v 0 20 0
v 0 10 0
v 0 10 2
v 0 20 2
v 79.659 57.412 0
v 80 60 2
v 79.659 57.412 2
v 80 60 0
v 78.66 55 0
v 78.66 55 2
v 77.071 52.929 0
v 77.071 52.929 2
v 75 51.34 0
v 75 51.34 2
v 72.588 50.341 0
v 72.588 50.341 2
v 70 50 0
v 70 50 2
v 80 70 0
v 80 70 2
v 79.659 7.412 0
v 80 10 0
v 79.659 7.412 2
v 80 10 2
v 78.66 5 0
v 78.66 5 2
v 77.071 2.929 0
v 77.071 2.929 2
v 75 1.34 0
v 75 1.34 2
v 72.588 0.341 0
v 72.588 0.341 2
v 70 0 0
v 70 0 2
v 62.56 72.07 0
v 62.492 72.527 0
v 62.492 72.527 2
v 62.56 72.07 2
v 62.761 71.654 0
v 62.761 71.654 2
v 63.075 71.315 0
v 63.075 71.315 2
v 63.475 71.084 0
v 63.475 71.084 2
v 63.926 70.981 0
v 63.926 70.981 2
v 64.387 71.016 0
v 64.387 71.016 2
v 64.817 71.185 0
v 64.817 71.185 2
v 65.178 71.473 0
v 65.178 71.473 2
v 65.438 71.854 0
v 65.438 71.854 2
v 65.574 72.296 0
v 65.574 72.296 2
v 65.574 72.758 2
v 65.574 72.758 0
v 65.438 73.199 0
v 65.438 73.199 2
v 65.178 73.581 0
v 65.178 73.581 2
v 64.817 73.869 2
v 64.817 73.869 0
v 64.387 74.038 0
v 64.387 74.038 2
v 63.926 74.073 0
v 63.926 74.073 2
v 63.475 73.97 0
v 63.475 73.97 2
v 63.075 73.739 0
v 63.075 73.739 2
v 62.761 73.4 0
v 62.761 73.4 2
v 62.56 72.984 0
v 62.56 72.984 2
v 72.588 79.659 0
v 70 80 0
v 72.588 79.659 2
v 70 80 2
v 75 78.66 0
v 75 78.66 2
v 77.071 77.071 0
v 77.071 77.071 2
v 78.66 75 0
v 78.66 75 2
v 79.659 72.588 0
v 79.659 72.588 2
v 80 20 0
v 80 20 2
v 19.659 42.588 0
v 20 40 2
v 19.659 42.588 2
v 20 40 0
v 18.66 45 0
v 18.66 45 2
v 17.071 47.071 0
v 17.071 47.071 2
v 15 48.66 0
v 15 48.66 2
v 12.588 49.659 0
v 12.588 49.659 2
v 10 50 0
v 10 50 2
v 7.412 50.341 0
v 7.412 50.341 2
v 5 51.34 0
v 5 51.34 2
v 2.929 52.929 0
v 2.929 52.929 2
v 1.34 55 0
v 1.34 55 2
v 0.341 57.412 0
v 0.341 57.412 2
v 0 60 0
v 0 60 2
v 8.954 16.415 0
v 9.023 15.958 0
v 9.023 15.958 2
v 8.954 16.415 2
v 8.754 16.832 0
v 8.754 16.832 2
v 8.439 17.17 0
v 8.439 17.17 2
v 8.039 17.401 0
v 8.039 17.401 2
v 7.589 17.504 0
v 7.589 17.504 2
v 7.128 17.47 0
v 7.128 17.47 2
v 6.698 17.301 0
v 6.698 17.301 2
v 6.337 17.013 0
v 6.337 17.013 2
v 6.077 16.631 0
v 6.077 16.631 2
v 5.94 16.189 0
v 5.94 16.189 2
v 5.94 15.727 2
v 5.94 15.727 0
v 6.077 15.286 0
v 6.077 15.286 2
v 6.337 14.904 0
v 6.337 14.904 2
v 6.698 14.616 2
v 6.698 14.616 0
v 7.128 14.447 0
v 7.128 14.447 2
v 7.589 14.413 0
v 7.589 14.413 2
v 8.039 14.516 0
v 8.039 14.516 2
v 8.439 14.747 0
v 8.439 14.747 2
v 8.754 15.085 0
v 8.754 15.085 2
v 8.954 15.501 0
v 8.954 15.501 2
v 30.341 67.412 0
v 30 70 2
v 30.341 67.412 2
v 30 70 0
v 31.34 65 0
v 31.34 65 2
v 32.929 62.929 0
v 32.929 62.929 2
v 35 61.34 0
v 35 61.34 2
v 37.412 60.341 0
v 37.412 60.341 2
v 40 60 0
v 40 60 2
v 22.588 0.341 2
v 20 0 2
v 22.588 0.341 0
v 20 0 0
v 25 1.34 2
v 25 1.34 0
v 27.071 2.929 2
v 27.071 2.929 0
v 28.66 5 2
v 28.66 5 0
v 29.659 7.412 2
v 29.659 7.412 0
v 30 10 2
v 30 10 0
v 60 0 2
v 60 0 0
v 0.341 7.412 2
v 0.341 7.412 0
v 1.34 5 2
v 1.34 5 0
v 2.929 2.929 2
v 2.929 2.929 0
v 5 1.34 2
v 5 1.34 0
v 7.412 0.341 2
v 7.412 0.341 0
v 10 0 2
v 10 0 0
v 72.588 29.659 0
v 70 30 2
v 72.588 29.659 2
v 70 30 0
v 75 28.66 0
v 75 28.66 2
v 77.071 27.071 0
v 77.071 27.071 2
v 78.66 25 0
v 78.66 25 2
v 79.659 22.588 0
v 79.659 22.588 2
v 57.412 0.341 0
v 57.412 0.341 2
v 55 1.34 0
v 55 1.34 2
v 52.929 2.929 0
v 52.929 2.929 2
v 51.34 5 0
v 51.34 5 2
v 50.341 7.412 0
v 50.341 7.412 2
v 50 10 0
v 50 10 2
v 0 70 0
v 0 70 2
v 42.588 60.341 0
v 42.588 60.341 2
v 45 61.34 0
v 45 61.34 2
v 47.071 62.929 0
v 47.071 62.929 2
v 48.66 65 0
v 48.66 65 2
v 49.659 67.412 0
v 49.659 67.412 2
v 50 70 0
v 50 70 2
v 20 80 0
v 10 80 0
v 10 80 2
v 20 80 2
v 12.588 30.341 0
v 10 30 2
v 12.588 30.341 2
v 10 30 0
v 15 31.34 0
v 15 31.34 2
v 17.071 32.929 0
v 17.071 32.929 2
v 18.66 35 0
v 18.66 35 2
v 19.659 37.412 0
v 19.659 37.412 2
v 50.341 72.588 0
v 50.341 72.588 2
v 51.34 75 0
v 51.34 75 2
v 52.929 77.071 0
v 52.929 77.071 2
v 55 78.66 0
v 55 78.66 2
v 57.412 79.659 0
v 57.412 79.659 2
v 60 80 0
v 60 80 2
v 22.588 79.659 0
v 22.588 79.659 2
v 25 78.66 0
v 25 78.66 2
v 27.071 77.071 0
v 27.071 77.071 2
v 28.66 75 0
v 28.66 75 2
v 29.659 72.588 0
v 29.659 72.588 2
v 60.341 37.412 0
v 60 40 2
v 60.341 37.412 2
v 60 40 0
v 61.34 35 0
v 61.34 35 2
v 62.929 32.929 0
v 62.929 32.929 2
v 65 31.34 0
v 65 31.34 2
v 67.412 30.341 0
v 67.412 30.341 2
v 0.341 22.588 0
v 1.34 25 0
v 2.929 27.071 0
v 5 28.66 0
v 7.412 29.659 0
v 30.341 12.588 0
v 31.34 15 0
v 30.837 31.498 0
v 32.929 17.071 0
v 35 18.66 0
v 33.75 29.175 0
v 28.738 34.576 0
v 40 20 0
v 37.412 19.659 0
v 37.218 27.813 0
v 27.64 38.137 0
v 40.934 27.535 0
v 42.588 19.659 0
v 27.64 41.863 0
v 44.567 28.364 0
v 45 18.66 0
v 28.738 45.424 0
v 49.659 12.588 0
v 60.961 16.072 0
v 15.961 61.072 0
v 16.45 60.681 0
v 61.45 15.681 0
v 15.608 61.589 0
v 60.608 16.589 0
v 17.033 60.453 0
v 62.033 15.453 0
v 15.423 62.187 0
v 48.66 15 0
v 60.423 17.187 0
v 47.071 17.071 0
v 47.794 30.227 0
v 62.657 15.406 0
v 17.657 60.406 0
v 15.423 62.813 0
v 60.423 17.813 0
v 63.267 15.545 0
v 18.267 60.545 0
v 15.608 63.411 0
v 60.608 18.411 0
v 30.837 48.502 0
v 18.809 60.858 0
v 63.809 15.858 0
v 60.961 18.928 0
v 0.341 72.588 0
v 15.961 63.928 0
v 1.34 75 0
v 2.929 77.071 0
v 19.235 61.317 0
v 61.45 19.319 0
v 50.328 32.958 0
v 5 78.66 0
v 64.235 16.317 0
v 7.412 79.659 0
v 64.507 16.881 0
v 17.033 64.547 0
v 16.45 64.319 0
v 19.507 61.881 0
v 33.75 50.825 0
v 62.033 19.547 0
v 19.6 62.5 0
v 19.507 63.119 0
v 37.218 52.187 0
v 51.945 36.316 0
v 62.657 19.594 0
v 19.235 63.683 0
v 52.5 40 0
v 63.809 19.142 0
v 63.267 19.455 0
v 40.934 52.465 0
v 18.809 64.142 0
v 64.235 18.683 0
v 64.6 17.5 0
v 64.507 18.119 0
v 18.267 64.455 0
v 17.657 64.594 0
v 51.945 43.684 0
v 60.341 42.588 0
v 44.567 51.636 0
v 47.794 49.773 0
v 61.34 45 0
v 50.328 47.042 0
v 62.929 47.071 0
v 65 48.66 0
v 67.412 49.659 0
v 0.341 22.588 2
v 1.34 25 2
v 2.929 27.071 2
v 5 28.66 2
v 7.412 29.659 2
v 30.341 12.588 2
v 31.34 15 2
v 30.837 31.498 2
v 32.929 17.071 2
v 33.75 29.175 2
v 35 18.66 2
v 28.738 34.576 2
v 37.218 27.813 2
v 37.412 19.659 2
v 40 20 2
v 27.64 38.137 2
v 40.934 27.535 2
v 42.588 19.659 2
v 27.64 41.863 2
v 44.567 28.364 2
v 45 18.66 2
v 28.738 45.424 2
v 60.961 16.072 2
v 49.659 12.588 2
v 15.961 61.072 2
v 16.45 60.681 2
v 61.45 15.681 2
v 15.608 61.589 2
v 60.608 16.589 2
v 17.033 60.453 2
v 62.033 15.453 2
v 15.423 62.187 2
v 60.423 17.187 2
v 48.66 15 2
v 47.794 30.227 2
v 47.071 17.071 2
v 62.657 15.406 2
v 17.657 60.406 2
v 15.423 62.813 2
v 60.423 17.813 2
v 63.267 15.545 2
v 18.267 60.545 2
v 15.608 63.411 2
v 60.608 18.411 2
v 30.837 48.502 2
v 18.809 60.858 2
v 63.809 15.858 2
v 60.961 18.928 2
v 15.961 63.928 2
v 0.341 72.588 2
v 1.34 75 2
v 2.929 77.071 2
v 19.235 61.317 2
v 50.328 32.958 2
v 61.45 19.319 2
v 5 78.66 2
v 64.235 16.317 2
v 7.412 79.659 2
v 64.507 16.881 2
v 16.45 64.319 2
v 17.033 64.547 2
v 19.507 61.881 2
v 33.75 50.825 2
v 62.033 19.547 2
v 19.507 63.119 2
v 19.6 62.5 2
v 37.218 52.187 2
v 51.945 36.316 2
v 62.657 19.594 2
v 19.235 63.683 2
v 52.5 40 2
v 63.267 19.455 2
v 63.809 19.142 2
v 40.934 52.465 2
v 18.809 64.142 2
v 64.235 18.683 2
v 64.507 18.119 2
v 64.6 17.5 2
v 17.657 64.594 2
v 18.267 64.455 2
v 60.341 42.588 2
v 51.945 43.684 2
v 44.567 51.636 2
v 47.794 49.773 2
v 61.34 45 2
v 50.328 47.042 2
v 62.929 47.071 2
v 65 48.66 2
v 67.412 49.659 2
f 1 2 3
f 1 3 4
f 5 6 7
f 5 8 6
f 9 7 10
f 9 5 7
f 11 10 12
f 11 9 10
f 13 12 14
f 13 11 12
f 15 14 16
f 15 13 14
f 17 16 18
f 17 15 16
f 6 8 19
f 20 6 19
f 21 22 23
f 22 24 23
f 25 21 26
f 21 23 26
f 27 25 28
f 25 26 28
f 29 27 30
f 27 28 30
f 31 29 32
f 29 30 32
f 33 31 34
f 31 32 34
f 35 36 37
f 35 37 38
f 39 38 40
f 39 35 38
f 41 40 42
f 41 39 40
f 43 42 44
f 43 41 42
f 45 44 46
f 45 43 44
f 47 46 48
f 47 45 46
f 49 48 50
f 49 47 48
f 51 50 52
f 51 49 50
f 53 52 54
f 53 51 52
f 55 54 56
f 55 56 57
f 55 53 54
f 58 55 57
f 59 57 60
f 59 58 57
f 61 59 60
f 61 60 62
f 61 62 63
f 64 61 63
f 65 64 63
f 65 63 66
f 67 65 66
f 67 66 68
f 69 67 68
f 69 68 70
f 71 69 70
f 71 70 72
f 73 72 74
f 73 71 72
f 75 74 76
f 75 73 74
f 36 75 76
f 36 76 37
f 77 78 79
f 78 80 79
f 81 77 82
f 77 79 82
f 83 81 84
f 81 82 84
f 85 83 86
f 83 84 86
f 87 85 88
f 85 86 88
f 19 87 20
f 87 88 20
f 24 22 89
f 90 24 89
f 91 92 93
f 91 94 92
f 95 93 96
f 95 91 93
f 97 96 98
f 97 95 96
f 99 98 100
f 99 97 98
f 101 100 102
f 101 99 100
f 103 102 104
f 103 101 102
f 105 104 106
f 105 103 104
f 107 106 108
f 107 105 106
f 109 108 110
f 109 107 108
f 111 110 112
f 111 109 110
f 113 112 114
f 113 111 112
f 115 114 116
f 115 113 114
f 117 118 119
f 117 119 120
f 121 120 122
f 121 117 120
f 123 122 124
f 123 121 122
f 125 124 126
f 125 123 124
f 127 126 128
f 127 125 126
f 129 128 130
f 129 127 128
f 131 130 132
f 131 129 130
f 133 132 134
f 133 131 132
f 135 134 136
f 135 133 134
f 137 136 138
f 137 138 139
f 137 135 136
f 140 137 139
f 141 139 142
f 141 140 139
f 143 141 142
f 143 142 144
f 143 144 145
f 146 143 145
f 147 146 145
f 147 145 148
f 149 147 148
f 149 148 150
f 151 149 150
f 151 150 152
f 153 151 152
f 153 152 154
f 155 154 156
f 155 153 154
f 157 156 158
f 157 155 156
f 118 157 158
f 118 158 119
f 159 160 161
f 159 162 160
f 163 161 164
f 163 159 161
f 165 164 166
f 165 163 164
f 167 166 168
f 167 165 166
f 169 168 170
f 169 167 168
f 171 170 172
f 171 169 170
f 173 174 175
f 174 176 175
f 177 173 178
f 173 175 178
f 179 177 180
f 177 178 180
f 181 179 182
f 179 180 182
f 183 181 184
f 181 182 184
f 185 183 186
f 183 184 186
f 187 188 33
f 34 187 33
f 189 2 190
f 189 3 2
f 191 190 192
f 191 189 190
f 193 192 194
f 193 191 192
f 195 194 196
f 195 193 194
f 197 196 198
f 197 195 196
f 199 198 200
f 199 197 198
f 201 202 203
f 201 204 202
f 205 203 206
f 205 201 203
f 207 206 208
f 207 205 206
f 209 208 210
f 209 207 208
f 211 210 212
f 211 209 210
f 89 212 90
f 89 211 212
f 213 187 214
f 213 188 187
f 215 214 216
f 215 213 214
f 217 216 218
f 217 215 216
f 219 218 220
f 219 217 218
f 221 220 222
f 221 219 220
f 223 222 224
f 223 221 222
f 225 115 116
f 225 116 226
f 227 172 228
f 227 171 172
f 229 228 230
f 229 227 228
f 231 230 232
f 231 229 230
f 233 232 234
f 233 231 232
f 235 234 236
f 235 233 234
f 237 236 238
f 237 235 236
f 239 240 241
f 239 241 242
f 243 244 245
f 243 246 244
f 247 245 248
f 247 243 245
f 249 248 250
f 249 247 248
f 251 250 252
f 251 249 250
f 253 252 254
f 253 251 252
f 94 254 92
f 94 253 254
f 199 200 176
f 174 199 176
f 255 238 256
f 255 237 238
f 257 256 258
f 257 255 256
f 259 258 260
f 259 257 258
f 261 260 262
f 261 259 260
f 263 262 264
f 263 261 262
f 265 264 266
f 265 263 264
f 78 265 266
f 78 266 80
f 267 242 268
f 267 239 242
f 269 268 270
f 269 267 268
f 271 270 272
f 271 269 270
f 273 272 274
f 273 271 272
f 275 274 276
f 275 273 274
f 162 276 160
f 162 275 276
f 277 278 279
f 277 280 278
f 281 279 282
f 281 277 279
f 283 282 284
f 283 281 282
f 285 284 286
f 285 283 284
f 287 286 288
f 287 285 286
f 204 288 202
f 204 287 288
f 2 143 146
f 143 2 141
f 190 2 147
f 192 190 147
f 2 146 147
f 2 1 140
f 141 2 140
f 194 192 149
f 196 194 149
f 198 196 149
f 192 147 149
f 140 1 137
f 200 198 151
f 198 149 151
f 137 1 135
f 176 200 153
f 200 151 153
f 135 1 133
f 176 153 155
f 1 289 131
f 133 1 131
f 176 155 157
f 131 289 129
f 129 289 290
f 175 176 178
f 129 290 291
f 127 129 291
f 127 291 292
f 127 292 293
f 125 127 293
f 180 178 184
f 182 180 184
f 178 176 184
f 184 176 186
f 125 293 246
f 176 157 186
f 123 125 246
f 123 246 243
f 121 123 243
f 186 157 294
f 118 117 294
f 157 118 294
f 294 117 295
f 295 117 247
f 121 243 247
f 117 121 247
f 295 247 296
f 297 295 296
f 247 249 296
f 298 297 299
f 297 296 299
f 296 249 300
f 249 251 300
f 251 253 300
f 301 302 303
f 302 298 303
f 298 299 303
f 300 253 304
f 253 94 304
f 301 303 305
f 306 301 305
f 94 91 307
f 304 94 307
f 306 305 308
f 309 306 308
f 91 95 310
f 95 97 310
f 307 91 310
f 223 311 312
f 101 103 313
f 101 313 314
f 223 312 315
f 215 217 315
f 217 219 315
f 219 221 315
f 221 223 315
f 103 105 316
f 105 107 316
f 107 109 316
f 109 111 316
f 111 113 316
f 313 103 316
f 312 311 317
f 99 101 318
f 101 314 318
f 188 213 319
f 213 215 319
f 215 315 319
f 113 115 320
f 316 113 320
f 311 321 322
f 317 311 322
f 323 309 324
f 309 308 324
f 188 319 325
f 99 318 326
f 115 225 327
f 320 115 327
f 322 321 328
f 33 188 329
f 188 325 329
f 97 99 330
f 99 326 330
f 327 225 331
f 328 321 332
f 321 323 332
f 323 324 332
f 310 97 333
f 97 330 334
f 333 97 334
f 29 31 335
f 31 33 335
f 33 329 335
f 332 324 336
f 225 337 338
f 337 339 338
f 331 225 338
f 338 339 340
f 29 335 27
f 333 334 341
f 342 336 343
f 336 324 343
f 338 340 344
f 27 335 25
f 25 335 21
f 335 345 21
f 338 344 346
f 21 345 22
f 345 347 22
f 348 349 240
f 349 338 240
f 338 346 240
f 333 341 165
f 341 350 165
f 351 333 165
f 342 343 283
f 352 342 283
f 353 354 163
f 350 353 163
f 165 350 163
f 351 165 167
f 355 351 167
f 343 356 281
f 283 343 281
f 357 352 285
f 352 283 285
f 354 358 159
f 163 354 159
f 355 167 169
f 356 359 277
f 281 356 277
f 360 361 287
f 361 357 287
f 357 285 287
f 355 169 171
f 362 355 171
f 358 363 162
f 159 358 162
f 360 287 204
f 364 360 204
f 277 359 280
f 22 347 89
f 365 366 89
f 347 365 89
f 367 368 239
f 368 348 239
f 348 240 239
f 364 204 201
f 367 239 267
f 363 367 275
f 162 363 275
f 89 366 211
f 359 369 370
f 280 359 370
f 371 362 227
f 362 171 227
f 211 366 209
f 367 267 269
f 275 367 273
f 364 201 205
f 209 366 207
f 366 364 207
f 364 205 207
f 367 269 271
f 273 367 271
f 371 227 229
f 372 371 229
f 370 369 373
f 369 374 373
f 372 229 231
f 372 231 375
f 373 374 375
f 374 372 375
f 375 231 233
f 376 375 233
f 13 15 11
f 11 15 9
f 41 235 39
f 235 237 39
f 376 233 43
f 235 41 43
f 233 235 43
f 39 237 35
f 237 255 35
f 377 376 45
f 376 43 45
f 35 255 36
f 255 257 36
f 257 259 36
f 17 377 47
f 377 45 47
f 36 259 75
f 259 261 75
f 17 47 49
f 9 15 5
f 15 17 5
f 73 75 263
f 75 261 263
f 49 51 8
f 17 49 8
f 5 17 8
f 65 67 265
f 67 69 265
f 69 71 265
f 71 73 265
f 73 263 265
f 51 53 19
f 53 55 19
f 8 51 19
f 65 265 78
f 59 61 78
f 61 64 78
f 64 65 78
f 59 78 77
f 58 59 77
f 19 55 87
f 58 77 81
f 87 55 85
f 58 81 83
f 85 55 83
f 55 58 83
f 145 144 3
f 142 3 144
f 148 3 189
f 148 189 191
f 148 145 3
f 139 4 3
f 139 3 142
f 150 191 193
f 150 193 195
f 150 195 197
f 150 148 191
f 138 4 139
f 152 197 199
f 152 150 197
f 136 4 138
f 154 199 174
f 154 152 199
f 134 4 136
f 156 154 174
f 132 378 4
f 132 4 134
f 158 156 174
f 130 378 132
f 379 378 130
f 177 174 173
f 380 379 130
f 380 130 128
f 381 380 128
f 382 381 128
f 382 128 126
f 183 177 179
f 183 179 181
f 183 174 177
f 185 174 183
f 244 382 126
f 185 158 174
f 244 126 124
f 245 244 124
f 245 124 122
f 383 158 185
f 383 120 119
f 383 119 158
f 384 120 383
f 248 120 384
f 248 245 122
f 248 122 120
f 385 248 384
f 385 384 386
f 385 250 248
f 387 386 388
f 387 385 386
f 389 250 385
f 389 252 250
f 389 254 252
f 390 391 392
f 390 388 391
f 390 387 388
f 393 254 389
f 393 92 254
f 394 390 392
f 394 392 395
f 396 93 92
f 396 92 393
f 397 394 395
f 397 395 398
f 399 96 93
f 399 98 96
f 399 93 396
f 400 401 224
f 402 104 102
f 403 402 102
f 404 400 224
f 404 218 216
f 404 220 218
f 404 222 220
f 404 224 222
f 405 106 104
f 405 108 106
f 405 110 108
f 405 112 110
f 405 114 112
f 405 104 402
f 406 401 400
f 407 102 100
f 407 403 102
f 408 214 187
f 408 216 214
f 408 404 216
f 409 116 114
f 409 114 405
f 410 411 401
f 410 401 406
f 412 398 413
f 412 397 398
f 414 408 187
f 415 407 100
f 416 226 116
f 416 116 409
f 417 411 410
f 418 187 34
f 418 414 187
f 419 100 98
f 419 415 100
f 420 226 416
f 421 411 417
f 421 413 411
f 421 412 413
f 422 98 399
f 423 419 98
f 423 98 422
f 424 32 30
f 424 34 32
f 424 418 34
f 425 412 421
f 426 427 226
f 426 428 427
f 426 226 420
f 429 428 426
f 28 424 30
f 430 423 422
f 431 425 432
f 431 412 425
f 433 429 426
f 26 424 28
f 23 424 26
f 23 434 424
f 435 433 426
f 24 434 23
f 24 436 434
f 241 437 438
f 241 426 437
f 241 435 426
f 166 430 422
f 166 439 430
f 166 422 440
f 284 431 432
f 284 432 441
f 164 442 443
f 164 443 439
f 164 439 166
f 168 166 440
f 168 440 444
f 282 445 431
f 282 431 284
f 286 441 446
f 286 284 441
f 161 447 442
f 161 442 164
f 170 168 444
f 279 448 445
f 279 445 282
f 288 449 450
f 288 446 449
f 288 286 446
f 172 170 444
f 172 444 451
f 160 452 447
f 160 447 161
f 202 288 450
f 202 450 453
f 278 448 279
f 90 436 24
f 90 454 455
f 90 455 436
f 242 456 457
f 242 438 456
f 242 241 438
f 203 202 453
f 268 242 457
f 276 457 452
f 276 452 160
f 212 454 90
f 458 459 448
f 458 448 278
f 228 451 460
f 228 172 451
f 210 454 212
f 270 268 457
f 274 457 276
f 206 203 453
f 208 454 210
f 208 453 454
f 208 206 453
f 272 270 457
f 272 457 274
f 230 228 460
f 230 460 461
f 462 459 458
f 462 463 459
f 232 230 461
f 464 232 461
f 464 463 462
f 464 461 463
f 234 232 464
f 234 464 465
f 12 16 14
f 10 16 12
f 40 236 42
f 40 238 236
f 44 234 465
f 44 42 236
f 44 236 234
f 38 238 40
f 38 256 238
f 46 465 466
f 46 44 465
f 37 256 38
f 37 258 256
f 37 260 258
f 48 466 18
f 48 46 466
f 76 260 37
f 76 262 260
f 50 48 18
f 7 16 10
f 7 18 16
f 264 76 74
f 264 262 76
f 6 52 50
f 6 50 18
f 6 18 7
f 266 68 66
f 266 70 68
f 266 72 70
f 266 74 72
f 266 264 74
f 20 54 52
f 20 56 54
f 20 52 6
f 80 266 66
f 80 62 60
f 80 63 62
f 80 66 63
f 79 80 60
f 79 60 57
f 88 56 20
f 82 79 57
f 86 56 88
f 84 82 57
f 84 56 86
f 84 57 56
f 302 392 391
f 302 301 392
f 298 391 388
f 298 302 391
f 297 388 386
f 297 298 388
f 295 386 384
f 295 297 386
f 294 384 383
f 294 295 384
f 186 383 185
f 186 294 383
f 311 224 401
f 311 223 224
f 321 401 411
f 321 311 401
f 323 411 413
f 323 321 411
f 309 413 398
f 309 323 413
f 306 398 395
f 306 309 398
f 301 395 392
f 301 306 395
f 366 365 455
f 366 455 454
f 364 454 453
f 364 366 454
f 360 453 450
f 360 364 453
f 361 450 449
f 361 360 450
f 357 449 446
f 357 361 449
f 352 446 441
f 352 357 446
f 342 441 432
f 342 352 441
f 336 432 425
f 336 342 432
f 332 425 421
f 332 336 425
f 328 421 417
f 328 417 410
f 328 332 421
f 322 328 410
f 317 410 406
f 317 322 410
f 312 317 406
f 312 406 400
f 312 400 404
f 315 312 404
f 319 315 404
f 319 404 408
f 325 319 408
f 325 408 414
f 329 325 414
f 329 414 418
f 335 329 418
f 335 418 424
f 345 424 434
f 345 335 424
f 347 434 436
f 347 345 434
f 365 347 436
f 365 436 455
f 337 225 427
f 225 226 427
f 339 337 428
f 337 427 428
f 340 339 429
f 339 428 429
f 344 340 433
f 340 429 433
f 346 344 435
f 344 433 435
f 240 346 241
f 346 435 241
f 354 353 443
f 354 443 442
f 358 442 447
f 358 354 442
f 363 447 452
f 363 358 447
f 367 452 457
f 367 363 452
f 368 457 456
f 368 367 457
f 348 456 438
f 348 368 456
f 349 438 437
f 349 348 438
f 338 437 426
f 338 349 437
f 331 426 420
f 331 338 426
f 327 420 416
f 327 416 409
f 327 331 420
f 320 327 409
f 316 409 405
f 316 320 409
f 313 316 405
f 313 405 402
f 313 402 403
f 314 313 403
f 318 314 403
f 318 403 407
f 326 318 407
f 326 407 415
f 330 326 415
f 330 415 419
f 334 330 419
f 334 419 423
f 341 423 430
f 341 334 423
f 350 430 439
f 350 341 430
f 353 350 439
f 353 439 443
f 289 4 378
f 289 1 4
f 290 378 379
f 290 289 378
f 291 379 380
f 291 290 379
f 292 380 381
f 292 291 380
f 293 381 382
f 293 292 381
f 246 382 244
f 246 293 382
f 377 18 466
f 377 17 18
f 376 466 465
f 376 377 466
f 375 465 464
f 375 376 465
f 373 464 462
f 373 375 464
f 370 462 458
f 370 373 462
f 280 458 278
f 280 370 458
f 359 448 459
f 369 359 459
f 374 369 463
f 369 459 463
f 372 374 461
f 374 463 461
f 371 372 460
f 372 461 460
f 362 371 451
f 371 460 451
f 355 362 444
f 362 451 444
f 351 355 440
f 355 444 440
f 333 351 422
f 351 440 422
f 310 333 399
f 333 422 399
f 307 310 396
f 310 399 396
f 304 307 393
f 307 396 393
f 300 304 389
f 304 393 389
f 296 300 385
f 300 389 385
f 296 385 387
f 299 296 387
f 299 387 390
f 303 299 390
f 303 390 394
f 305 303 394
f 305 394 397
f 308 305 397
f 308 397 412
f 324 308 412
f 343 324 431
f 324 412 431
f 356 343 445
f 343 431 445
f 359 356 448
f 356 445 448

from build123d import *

# Parameters (mm, degrees)
SKETCH_1_W          = 80
SKETCH_1_H          = 80
SKETCH_1_R          = 2.1
SKETCH_1_R_2        = 1.55
EXTRUDE_1_DEPTH     = 2
SKETCH_2_W          = 20
SKETCH_2_H          = 20
CUT_EXTRUDE_1_DEPTH = 2
FILLET_1_R          = 10
SKETCH_3_R          = 12.5
CUT_EXTRUDE_2_DEPTH = 2


with BuildPart() as part:
    # 草图1 → 凸台-拉伸1 (new body)
    with BuildSketch(Plane.XY):
        with Locations((40, 40)):
            Rectangle(SKETCH_1_W, SKETCH_1_H)
        with Locations((17.5, 62.5)):
            Circle(SKETCH_1_R, mode=Mode.SUBTRACT)
        with Locations((62.5, 17.5)):
            Circle(SKETCH_1_R, mode=Mode.SUBTRACT)
        with Locations((7.473088065, 15.95836944)):
            Circle(SKETCH_1_R_2, mode=Mode.SUBTRACT)
        with Locations(Location((64.04163056, 72.526911935, 0), (0, 0, 180))):
            Circle(SKETCH_1_R_2, mode=Mode.SUBTRACT)
    extrude(amount=EXTRUDE_1_DEPTH)

    # 草图2 → 切除-拉伸1 (cut)
    with BuildSketch(Plane.XY.offset(2)):
        with Locations((40, 70)):
            Rectangle(SKETCH_2_W, SKETCH_2_H)
        with Locations((70, 40)):
            Rectangle(SKETCH_2_W, SKETCH_2_H)
        with Locations((40, 10)):
            Rectangle(SKETCH_2_W, SKETCH_2_H)
        with Locations((10, 40)):
            Rectangle(SKETCH_2_W, SKETCH_2_H)
    extrude(amount=-CUT_EXTRUDE_1_DEPTH, mode=Mode.SUBTRACT)

    # 圆角1
    fillet_1_edges = [part.edges().sort_by_distance(p)[0] for p in [
        (0, 50, 1),
        (20, 50, 1),
        (20, 30, 1),
        (0, 30, 1),
        (0, 0, 1),
        (30, 0, 1),
        (30, 20, 1),
        (50, 20, 1),
        (50, 0, 1),
        (80, 0, 1),
        (80, 30, 1),
        (60, 30, 1),
        (60, 50, 1),
        (80, 50, 1),
        (80, 80, 1),
        (50, 80, 1),
        (50, 60, 1),
        (30, 60, 1),
        (30, 80, 1),
        (0, 80, 1),
    ]]
    fillet(fillet_1_edges, radius=FILLET_1_R - 0.0001)  # a hair under: the kernel refuses the full size

    # 草图3 → 切除-拉伸2 (cut)
    with BuildSketch(Plane.XY.offset(2)):
        with Locations((40, 40)):
            Circle(SKETCH_3_R)
    extrude(amount=-CUT_EXTRUDE_2_DEPTH, mode=Mode.SUBTRACT)


solid = part.part
